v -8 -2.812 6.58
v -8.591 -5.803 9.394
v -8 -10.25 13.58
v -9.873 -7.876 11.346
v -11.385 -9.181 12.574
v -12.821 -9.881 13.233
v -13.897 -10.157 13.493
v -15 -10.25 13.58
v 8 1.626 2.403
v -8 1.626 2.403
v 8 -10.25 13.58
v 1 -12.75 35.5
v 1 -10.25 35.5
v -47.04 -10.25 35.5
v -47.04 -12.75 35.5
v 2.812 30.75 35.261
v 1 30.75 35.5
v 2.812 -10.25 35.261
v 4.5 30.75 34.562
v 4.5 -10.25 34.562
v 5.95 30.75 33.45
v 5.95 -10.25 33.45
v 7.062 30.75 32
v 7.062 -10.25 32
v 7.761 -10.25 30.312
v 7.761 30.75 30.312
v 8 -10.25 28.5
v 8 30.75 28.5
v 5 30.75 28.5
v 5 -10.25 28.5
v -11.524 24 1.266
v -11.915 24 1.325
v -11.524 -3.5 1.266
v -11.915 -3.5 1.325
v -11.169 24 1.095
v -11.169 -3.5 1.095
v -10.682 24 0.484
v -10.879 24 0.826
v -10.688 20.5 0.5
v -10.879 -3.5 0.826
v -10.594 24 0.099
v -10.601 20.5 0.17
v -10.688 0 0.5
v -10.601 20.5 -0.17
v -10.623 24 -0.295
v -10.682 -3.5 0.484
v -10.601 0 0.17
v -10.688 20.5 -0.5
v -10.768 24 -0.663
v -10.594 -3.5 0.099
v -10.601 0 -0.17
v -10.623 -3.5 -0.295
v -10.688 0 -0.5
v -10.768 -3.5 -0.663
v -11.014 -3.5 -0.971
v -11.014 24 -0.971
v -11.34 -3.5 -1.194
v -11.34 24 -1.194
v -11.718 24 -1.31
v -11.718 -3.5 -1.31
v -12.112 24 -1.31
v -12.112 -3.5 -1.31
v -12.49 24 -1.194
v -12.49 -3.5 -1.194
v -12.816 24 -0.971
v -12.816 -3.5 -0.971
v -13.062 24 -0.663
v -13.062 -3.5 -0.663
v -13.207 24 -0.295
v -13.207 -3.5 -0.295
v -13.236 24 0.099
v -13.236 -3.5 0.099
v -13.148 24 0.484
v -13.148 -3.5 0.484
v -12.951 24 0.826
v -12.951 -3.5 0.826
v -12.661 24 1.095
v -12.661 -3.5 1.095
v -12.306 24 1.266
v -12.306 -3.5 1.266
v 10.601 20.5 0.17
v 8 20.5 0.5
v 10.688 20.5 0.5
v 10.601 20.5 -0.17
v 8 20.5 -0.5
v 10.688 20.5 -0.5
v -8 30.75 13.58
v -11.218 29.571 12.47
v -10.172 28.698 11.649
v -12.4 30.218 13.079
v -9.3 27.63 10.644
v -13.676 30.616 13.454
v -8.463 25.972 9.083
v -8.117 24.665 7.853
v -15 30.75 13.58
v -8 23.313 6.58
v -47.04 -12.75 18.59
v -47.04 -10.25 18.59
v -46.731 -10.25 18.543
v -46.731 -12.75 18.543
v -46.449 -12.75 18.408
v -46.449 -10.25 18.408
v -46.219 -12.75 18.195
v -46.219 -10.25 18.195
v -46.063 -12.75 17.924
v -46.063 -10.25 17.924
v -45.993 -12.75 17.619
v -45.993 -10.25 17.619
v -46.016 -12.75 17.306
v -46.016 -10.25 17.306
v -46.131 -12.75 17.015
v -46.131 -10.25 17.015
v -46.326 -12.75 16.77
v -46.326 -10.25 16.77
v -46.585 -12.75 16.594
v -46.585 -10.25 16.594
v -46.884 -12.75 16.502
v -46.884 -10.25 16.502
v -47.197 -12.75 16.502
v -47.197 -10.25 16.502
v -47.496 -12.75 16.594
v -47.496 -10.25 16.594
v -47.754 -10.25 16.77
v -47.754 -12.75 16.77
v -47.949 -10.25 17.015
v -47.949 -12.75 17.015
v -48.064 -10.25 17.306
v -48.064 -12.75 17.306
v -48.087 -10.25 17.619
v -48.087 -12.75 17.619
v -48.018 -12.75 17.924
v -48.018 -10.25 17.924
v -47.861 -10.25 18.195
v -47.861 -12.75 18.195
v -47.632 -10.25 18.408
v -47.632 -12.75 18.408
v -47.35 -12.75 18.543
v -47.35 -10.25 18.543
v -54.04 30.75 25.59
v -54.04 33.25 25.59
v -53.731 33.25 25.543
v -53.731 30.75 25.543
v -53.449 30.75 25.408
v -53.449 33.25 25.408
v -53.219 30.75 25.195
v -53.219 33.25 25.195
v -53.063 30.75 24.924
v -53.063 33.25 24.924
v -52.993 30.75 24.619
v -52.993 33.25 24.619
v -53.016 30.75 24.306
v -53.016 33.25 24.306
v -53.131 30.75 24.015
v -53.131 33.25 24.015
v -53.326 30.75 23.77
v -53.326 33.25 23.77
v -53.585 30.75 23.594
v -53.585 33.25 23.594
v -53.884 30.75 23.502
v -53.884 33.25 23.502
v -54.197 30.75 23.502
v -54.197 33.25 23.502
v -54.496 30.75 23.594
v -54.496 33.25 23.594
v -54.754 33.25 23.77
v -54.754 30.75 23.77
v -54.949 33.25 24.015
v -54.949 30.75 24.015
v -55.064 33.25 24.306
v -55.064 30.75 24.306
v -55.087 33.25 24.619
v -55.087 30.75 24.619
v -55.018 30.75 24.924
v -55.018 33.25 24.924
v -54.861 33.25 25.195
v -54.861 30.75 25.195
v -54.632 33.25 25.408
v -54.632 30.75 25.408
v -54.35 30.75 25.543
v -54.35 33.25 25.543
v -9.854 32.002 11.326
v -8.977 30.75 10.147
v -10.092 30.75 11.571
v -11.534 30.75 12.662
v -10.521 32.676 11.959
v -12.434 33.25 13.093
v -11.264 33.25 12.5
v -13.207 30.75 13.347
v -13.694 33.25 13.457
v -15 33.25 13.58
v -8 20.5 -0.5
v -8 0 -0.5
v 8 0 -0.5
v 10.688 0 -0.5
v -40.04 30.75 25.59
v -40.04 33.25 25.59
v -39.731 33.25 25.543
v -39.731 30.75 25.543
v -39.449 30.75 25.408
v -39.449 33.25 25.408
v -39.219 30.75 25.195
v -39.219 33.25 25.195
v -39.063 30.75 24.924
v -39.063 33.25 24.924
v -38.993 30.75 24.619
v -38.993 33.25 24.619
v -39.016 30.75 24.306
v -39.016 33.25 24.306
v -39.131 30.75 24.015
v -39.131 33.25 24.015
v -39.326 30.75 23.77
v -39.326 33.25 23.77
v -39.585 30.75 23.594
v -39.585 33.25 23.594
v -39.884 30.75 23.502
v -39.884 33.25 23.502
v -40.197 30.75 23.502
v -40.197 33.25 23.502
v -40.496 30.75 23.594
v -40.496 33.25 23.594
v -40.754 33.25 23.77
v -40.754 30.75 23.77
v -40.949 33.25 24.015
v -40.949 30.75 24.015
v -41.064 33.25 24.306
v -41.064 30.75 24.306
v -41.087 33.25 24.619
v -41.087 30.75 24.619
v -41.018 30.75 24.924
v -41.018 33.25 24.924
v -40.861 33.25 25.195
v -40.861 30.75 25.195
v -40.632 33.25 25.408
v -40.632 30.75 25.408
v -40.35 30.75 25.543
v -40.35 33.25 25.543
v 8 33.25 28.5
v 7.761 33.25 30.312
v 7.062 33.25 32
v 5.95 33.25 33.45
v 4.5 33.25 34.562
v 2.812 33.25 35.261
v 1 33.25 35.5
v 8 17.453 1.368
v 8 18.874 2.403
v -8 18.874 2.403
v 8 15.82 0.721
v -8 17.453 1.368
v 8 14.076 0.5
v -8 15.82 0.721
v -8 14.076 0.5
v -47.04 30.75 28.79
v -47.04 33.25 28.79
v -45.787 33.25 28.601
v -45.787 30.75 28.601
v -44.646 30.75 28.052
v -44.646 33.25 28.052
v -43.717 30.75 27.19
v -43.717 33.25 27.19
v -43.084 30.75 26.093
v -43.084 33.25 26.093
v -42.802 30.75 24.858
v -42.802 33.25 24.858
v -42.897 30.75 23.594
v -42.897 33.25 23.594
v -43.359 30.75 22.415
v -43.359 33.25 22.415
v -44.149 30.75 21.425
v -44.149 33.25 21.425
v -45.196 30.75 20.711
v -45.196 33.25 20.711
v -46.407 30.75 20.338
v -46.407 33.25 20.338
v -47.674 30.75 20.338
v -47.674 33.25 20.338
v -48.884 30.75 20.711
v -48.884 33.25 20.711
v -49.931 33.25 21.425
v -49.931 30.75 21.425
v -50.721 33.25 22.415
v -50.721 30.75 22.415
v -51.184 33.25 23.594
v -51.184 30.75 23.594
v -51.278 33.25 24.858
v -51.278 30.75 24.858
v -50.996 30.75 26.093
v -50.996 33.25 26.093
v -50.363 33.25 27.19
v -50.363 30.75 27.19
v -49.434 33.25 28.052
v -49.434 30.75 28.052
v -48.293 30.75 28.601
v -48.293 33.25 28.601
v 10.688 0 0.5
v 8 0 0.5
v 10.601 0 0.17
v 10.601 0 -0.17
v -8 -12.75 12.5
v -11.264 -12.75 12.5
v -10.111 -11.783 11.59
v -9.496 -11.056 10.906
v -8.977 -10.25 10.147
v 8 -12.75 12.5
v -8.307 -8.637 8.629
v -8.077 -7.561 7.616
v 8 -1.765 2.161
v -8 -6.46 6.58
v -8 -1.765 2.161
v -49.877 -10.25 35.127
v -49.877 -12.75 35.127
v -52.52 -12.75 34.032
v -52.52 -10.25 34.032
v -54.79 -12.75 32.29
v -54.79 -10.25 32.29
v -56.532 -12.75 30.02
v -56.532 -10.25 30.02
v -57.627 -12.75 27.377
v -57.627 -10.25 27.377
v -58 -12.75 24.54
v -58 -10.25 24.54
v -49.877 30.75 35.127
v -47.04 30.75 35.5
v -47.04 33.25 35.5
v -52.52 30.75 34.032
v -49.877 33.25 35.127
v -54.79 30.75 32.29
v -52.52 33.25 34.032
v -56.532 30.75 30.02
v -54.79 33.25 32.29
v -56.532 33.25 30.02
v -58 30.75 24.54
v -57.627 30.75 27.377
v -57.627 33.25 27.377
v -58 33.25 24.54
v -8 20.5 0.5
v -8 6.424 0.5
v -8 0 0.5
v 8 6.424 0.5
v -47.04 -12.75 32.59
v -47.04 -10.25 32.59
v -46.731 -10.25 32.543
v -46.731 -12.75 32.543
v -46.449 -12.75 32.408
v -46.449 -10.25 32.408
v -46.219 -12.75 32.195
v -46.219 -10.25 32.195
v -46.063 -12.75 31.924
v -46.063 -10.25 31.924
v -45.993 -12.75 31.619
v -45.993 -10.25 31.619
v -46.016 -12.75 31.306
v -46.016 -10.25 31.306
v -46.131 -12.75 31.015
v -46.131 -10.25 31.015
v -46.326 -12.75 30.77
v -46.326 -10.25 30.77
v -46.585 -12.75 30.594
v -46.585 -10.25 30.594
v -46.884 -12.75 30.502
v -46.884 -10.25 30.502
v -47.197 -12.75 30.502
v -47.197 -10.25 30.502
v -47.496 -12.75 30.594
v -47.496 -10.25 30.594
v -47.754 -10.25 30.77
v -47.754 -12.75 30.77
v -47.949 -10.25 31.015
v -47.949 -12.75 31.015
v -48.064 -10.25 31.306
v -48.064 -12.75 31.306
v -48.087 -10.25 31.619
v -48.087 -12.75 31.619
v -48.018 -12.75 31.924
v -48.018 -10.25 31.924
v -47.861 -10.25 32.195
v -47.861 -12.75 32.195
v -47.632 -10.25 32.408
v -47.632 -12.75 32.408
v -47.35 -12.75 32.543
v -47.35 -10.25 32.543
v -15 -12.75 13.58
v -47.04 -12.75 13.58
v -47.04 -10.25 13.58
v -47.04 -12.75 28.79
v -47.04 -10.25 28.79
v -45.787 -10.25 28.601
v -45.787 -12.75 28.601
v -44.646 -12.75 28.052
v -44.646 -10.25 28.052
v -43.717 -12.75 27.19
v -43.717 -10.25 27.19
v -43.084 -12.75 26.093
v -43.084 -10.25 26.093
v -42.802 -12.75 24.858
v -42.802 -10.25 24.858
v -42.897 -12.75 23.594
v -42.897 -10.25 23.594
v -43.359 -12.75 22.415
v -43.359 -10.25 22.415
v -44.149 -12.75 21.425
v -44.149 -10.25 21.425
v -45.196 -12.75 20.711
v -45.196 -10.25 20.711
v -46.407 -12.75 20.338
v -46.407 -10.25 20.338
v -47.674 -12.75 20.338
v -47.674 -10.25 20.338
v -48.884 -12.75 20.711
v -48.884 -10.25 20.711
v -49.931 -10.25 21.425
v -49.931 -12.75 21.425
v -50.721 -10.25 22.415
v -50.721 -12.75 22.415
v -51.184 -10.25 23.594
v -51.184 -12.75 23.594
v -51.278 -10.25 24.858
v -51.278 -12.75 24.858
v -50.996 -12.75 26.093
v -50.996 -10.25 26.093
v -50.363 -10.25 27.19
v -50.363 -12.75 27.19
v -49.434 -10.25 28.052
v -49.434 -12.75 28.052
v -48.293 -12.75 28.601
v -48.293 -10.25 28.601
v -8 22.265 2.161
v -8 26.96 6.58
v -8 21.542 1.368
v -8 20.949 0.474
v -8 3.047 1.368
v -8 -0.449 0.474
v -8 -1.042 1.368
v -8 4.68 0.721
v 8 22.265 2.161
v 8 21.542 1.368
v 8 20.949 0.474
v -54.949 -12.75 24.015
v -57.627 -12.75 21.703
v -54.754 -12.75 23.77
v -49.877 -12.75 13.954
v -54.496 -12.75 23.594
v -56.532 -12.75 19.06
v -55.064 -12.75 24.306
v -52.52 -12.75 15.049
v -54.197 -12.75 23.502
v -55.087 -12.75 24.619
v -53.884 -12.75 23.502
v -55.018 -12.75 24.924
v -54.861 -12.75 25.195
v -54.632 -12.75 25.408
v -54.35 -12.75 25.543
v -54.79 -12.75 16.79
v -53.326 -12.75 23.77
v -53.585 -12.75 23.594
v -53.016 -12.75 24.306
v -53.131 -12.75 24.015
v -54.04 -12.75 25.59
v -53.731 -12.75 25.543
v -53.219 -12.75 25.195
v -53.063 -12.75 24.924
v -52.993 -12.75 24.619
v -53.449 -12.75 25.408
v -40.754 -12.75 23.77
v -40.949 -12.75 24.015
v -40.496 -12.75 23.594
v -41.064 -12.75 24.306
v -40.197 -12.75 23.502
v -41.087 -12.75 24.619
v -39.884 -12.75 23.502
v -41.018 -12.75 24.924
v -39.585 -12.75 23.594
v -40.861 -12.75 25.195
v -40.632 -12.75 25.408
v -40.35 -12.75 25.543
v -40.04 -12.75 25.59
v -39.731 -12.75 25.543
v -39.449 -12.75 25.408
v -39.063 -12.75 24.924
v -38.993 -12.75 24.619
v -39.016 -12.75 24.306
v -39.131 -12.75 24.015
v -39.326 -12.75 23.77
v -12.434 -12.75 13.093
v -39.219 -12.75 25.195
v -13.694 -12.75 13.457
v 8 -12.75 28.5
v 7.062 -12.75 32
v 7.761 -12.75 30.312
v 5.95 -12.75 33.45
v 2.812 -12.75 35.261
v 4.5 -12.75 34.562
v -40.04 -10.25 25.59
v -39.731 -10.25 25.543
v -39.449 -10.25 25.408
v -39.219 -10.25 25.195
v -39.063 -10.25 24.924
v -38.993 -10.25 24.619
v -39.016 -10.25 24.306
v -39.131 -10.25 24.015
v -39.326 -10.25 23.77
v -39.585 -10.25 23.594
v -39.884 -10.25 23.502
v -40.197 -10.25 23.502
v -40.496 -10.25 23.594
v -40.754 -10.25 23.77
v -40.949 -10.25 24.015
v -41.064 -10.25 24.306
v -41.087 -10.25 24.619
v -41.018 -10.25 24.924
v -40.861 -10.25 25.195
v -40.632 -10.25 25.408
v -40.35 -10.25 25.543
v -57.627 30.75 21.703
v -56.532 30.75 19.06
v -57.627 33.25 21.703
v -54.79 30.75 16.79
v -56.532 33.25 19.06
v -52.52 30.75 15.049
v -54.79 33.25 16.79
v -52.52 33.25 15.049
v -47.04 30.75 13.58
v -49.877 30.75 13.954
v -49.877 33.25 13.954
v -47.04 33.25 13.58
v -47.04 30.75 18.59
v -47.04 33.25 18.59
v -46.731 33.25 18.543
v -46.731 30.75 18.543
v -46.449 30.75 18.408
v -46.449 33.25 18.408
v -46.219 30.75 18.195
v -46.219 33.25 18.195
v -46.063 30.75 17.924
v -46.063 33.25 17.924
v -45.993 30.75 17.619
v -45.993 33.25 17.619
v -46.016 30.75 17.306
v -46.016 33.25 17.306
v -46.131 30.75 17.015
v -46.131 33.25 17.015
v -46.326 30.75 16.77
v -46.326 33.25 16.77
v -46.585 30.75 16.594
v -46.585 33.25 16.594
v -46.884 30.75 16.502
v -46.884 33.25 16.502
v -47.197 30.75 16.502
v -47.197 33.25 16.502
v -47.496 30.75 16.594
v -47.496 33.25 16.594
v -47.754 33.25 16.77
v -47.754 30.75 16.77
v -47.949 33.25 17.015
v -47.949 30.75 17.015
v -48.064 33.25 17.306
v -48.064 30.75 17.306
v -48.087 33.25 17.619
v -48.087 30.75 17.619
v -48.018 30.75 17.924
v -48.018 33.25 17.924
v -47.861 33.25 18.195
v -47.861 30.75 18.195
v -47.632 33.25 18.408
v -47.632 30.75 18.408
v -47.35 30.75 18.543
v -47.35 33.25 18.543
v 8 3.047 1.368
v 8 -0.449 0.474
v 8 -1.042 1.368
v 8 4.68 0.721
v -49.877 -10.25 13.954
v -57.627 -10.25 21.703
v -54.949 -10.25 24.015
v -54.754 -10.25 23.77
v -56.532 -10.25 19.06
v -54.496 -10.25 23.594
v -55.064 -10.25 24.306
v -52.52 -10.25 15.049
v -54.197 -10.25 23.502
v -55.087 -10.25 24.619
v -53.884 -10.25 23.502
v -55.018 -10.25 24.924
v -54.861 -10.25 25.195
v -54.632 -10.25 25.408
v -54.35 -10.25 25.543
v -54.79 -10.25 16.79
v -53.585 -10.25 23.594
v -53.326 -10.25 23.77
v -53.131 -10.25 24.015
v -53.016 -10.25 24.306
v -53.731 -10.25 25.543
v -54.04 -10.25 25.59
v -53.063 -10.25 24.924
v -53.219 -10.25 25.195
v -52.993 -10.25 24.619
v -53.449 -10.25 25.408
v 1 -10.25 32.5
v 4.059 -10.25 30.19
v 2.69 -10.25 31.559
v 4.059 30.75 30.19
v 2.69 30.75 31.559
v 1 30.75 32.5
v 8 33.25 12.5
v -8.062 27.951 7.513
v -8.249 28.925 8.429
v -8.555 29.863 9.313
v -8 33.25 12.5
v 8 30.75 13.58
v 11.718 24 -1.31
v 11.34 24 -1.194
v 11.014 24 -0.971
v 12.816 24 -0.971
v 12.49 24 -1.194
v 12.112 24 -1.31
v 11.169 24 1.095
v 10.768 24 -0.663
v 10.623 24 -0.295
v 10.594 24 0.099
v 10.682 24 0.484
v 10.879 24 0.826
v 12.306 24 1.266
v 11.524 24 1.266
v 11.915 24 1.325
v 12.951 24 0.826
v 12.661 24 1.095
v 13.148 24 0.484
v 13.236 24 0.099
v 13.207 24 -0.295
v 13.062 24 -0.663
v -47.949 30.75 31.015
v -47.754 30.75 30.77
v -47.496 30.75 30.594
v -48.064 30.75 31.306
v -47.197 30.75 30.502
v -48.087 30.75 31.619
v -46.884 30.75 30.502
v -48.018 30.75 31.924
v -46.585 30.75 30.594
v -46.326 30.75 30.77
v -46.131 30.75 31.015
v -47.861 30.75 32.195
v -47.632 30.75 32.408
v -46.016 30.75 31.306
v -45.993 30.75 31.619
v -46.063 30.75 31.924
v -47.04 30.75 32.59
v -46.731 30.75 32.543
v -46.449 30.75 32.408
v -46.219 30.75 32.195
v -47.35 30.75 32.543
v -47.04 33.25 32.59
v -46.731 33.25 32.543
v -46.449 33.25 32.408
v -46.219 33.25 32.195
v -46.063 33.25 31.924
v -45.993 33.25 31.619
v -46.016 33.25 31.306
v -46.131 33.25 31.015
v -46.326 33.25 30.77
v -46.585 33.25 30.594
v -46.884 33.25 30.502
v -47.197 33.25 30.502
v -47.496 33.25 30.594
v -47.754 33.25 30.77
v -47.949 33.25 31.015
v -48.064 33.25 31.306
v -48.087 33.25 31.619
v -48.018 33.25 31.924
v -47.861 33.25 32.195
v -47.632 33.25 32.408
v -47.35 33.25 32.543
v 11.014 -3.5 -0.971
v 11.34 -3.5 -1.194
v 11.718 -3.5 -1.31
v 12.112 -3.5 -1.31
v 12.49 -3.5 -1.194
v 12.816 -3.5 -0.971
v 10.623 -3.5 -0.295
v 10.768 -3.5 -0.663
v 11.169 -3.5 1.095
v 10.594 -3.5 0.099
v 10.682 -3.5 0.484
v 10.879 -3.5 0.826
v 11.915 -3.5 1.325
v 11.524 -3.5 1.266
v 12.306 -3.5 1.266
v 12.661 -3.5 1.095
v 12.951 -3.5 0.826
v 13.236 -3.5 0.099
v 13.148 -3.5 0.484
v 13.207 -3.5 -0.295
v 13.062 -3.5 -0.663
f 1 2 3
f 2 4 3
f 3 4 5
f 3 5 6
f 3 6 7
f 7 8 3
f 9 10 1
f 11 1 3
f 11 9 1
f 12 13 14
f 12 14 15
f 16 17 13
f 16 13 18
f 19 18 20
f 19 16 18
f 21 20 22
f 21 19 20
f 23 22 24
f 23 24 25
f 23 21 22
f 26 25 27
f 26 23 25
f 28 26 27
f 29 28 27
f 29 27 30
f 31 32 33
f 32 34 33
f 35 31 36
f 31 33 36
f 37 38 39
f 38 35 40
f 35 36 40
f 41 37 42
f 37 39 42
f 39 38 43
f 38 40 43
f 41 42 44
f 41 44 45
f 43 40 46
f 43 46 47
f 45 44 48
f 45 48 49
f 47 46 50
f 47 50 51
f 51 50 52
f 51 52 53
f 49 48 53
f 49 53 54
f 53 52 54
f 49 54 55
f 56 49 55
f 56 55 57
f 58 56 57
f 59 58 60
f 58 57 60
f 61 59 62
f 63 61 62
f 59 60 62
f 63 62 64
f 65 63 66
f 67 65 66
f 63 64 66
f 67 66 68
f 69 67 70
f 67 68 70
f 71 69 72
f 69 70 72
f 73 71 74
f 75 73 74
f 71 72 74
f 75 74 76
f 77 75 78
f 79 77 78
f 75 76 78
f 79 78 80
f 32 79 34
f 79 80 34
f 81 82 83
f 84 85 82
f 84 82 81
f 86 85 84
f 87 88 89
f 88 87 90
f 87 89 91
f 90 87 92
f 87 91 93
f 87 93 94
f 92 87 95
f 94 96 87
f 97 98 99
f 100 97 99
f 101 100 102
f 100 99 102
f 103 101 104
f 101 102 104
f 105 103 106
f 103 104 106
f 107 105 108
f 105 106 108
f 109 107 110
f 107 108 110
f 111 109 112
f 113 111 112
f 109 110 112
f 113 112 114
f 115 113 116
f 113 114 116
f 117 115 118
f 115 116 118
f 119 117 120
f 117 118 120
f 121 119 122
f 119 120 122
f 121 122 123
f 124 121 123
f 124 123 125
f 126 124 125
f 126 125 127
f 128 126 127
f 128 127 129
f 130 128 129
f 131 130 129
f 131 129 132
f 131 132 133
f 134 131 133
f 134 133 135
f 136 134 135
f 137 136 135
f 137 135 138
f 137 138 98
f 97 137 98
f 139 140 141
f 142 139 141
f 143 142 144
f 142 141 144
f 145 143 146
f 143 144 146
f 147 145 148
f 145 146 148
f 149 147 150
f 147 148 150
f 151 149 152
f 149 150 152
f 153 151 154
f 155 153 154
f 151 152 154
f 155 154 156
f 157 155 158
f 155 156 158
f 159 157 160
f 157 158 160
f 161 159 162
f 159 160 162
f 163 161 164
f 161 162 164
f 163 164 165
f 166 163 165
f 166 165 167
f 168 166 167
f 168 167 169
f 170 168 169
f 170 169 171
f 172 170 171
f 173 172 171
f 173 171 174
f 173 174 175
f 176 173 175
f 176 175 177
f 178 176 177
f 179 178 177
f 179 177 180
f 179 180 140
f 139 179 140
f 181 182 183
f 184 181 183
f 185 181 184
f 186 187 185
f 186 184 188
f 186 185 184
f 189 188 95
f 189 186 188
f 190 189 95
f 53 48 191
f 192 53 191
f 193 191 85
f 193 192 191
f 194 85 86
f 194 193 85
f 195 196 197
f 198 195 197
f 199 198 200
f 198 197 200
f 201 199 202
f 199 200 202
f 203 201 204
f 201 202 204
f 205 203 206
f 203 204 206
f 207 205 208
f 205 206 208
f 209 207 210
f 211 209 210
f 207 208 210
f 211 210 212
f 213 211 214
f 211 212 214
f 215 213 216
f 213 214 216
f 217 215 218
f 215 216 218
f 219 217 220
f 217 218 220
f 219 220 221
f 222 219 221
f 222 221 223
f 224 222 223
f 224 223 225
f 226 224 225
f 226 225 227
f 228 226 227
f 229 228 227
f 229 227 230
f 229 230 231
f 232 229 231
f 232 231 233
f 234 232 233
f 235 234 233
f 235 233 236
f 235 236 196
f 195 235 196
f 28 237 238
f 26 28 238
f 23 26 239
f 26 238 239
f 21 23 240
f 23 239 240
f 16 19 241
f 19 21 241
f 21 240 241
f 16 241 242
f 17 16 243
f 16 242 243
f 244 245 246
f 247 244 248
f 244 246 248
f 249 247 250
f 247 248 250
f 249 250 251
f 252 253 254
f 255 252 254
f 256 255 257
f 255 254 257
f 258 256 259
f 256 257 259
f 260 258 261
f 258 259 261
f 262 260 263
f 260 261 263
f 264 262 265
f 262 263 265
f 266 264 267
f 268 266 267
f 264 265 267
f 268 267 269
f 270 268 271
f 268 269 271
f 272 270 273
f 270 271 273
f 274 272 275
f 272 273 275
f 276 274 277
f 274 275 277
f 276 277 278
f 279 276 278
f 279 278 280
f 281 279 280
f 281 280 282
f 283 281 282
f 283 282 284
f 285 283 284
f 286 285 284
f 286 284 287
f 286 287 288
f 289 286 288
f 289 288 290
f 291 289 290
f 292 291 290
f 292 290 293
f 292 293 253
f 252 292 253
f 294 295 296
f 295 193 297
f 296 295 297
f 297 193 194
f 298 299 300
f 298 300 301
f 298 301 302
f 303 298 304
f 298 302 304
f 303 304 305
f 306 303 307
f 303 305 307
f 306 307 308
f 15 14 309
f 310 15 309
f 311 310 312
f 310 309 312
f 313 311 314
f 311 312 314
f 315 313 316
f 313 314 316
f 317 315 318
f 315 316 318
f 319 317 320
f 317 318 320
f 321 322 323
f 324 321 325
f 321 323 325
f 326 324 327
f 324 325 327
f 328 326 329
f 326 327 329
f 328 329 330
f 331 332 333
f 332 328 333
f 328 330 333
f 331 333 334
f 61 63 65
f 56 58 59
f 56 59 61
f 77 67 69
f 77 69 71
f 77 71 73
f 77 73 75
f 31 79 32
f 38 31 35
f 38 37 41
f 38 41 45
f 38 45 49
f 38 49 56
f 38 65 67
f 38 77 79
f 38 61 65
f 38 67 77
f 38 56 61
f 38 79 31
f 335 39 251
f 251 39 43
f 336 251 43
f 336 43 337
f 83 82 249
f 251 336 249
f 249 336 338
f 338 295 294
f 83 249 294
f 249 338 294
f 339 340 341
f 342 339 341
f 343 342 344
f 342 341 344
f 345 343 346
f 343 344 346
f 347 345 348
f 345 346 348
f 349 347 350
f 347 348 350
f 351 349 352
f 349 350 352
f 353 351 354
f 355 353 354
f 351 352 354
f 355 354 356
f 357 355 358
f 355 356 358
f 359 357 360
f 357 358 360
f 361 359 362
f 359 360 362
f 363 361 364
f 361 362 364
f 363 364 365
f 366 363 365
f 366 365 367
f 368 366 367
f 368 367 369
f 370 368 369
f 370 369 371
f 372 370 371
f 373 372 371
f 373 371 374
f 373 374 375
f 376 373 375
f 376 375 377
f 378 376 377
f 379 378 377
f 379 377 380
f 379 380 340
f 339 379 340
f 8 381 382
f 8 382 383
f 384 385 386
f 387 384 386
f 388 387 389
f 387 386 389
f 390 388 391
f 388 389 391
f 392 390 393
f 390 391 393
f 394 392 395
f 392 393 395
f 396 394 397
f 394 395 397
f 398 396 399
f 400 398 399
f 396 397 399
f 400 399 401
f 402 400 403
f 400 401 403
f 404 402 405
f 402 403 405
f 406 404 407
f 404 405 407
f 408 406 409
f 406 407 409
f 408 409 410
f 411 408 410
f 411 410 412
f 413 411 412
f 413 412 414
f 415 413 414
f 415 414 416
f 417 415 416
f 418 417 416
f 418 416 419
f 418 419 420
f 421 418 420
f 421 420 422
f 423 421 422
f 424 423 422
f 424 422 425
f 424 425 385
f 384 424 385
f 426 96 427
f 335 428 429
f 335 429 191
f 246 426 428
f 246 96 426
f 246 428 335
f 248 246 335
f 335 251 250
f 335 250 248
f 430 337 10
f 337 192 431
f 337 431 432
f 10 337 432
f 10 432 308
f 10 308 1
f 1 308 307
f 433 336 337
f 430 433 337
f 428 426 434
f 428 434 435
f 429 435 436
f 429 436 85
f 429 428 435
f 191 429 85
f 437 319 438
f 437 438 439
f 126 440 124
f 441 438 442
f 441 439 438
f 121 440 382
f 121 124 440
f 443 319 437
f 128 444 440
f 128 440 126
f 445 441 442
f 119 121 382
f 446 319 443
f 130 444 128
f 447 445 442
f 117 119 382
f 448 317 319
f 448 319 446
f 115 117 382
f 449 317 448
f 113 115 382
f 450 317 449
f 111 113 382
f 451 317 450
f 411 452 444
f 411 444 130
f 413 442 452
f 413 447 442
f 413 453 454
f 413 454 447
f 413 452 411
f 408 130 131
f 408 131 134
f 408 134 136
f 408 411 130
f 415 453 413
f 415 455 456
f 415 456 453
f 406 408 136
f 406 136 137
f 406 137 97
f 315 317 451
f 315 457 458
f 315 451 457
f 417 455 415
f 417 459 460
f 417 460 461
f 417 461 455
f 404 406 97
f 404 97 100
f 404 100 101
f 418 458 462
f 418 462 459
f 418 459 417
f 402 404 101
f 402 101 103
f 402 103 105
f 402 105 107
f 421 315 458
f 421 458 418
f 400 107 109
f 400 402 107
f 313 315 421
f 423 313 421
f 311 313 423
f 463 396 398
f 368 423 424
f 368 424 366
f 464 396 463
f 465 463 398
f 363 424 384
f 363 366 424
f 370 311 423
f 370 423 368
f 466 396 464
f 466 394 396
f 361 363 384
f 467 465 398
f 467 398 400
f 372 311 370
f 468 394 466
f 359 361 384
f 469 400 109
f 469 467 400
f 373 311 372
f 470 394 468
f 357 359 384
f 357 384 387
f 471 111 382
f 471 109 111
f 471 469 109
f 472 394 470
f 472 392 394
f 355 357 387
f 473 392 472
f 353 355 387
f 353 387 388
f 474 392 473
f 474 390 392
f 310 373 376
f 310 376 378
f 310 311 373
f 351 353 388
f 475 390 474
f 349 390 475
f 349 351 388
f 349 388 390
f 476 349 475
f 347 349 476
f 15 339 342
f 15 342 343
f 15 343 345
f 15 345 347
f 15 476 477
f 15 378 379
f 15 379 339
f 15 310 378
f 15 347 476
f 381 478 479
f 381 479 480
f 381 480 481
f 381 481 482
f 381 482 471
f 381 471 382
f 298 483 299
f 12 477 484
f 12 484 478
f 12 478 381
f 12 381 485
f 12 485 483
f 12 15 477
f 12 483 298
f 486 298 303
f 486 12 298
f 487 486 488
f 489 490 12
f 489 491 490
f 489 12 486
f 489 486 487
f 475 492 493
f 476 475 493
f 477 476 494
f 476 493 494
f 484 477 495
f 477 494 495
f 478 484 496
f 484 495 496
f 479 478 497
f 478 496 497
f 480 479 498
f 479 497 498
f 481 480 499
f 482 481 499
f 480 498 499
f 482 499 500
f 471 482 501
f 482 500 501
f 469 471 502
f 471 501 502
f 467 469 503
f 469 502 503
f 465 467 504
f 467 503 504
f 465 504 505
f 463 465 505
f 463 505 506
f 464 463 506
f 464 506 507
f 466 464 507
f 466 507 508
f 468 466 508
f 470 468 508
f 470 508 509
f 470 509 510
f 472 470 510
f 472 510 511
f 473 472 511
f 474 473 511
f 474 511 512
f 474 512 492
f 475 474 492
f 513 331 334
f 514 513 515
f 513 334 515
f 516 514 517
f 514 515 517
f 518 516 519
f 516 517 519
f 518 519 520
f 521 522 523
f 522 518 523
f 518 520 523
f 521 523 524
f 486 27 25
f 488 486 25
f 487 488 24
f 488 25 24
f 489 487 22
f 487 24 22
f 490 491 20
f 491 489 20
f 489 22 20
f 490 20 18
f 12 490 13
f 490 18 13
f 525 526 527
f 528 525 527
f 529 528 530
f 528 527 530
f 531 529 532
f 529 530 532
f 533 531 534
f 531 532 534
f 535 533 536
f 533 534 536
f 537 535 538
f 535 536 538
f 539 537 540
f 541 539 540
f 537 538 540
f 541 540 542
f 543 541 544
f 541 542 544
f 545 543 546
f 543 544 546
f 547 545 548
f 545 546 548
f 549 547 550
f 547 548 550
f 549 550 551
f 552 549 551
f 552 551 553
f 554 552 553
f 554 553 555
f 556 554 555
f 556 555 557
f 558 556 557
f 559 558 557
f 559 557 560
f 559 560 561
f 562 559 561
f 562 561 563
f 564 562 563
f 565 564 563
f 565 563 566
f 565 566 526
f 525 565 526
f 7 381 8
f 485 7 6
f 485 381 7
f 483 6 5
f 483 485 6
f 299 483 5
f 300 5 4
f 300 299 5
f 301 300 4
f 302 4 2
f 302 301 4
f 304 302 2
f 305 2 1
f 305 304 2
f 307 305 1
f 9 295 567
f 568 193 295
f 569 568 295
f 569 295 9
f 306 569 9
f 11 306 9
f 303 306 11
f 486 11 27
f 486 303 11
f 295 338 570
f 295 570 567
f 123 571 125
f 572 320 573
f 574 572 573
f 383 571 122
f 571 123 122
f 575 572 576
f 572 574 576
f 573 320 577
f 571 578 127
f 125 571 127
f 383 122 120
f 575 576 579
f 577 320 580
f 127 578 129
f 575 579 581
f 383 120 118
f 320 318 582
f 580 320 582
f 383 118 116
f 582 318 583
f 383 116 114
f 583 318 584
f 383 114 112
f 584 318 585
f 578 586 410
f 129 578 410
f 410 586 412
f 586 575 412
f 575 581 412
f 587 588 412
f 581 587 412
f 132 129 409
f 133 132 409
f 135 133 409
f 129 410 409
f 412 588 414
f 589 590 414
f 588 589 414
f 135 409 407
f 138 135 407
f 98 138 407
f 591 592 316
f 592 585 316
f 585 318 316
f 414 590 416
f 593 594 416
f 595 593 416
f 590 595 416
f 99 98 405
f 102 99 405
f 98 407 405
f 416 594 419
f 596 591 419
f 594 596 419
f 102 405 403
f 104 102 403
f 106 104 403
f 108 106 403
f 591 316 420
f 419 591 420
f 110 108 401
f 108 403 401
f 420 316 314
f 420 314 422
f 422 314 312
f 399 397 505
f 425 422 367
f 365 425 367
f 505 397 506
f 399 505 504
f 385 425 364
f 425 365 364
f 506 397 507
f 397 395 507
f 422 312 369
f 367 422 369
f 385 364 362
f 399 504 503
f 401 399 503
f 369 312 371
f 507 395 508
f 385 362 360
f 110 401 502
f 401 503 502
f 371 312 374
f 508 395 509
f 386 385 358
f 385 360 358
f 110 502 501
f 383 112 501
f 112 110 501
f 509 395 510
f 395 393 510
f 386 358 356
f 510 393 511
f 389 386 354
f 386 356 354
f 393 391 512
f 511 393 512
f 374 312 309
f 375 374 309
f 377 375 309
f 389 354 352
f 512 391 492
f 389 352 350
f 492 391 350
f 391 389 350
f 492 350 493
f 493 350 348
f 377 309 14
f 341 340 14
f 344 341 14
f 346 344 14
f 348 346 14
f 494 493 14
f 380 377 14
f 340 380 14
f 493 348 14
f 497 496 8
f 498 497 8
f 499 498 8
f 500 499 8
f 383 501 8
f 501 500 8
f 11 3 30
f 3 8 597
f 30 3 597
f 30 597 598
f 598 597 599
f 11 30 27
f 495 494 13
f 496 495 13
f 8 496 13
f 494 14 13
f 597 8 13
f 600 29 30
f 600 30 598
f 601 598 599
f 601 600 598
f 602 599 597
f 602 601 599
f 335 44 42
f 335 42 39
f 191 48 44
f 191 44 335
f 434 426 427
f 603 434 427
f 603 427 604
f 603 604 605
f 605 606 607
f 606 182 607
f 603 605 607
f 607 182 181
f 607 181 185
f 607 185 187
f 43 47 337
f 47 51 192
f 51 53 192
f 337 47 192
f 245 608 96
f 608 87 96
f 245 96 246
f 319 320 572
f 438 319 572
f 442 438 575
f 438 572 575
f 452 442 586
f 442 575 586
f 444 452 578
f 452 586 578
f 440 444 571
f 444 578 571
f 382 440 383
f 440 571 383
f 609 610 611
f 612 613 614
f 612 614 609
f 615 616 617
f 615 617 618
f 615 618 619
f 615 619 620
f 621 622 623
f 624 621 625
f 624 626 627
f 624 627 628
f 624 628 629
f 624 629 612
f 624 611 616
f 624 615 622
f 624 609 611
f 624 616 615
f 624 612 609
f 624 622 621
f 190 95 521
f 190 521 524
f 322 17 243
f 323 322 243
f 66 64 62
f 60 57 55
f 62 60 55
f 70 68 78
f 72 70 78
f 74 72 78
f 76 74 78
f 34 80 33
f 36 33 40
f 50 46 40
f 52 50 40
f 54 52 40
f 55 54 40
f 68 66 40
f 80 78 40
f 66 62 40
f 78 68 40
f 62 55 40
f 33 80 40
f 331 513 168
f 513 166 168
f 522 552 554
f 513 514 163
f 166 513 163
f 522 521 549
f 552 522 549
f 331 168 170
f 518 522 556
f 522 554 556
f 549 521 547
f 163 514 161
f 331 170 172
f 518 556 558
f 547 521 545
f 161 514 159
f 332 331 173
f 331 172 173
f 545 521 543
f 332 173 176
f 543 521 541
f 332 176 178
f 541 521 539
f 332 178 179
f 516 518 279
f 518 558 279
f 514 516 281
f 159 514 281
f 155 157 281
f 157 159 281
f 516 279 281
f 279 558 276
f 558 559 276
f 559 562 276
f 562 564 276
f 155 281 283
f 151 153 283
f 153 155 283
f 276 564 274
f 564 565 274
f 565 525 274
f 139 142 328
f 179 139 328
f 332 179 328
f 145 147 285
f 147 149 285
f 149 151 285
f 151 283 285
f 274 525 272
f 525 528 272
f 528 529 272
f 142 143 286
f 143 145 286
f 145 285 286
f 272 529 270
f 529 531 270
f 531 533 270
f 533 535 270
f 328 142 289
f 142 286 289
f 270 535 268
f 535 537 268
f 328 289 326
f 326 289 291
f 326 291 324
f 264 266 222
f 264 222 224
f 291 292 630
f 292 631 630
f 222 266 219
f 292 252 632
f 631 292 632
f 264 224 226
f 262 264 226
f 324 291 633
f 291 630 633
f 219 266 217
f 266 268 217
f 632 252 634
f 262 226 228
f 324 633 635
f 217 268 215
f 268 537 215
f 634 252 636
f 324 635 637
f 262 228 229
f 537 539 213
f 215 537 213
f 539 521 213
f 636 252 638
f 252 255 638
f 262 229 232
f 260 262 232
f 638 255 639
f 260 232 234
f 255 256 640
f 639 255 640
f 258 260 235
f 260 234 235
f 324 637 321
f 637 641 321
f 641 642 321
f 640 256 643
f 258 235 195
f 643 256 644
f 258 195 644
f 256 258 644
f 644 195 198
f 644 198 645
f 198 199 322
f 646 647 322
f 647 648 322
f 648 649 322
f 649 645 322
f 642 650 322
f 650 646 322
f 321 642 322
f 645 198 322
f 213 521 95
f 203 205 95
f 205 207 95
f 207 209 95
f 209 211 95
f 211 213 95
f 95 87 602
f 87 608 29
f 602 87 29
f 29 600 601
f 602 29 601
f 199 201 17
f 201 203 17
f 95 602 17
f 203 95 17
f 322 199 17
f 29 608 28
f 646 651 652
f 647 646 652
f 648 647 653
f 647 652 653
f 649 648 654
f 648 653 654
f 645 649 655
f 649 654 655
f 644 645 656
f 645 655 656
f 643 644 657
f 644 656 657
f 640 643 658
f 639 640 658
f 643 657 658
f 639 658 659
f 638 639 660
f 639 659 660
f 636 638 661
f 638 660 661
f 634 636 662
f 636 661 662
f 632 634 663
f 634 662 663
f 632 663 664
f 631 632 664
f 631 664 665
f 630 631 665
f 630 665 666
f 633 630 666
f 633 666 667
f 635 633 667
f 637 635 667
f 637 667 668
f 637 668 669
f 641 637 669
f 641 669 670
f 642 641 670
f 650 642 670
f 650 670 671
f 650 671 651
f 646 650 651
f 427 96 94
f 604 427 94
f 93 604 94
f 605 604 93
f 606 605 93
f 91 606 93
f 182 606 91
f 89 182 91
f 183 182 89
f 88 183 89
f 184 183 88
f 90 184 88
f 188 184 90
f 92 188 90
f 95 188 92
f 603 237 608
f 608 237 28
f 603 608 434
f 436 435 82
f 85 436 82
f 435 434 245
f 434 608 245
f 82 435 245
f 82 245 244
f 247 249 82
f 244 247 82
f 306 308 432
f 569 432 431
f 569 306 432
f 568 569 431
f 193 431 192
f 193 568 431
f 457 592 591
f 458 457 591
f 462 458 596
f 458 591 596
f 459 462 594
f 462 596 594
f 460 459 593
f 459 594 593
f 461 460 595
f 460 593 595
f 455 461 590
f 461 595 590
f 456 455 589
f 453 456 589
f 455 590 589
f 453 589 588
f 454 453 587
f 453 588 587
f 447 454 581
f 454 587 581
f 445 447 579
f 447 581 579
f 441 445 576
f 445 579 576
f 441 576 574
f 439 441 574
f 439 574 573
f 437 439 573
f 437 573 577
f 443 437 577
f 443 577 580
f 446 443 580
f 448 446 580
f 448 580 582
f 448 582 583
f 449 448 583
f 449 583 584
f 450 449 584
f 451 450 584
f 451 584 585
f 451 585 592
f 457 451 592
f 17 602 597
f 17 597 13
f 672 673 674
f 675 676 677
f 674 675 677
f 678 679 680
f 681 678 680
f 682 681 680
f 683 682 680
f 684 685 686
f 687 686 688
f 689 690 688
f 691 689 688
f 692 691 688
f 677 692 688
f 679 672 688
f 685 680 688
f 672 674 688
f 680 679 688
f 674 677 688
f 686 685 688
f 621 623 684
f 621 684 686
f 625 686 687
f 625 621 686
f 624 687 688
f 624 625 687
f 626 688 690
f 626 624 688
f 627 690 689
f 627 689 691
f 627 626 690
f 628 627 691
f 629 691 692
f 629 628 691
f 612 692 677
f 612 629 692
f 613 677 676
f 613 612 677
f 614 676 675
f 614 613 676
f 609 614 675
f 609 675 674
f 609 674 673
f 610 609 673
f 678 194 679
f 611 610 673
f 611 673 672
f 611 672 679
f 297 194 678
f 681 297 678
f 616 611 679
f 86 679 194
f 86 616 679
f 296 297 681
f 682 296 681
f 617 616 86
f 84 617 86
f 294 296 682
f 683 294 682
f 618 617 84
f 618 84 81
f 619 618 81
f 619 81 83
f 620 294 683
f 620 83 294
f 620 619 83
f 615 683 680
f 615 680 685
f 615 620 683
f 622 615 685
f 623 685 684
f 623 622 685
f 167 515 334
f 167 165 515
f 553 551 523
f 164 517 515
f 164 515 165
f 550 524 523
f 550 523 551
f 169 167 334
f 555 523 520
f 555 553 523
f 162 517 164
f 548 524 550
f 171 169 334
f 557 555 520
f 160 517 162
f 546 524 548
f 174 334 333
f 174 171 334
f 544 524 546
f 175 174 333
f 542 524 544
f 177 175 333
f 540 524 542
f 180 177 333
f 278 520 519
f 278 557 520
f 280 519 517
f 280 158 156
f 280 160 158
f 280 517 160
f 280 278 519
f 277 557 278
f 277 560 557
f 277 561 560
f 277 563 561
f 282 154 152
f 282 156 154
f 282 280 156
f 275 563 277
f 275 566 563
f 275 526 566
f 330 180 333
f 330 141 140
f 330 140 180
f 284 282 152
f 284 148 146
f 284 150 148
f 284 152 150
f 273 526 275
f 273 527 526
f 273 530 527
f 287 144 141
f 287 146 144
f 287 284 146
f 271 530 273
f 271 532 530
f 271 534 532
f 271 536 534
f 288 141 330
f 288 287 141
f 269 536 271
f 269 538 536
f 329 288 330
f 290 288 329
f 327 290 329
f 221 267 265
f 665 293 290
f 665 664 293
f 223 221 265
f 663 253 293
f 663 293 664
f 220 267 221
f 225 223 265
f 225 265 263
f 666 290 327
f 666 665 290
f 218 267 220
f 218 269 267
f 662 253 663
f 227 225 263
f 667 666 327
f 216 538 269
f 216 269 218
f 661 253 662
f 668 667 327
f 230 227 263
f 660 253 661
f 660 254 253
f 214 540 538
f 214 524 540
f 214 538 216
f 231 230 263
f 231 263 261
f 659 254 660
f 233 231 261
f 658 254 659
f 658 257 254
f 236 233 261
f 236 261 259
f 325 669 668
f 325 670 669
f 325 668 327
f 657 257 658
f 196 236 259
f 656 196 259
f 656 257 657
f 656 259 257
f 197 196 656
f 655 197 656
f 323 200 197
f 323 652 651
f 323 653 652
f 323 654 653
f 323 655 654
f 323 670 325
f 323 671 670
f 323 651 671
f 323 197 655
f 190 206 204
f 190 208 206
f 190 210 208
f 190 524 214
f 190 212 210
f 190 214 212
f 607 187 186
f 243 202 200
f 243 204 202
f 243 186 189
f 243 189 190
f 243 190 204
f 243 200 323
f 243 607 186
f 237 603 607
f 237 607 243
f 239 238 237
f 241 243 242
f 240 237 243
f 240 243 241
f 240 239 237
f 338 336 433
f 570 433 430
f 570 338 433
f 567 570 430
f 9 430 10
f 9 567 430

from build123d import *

# Parameters (mm, degrees)
SKETCH1_W           = 23.83
SKETCH1_H           = 1
BOSS_EXTRUDE1_DEPTH = 20.5
SKETCH2_R           = 1.325
BOSS_EXTRUDE2_DEPTH = 13.75
BOSS_EXTRUDE4_DEPTH = 8
SKETCH5_W           = 21.919818374
SKETCH5_H           = 2.5
BOSS_EXTRUDE5_DEPTH = 50
SKETCH6_R           = 4.25
SKETCH6_R_2         = 1.05
CUT_EXTRUDE1_DEPTH  = 83.099025573
FILLET1_R           = 7
FILLET2_R           = 7
FILLET3_R           = 7
BOSS_EXTRUDE6_START = 41
BOSS_EXTRUDE6_DEPTH = 41


with BuildPart() as part:
    # Sketch1 → Boss-Extrude1 (new body)
    with BuildSketch(Plane(origin=(0, 0, 0), x_dir=(1, 0, 0), z_dir=(0, 1, 0))):
        Rectangle(SKETCH1_W, SKETCH1_H)
    extrude(amount=BOSS_EXTRUDE1_DEPTH)

    # Sketch2 → Boss-Extrude2 (add, symmetric)
    with BuildSketch(Plane(origin=(0, 10.25, 0), x_dir=(1, 0, 0), z_dir=(0, 1, 0))):
        with Locations(Location((-11.915, 0, 0), (0, 0, 270))):
            Circle(SKETCH2_R)
        with Locations(Location((11.915, 0, 0), (0, 0, 270))):
            Circle(SKETCH2_R)
    extrude(amount=BOSS_EXTRUDE2_DEPTH, both=True)

    # Sketch4 → Boss-Extrude4 (add, symmetric)
    with BuildSketch(Plane(origin=(0, 0, 0), x_dir=(0, 0, -1), z_dir=(1, 0, 0))):
        Polygon((-0.5, 16.852307022), (-0.5, 20.5), (-12.5, 33.25), (-35.5, 33.25), (-35.5, 30.75), (-13.580181626, 30.75), align=None)
        Polygon((-0.5, 0), (-0.5, 3.647692978), (-13.580181626, -10.25), (-35.5, -10.25), (-35.5, -12.75), (-12.5, -12.75), align=None)
    extrude(amount=BOSS_EXTRUDE4_DEPTH, both=True)

    # Sketch5 → Boss-Extrude5 (add)
    with BuildSketch(Plane.ZY.offset(8)):
        with Locations((24.540090813, 32)):
            Rectangle(SKETCH5_W, SKETCH5_H)
        with Locations((24.540090813, -11.5)):
            Rectangle(SKETCH5_W, SKETCH5_H)
    extrude(amount=BOSS_EXTRUDE5_DEPTH)

    # Sketch6 → Cut-Extrude1 (cut, through all)
    with BuildSketch(Plane(origin=(0, 33.25, 0), x_dir=(1, 0, 0), z_dir=(0, 1, 0))):
        with Locations(Location((-47.040090813, -24.540090813, 0), (0, 0, 270))):
            Circle(SKETCH6_R)
        with Locations(Location((-54.040090813, -24.540090813, 0), (0, 0, 270))):
            Circle(SKETCH6_R_2)
        with Locations(Location((-47.040090813, -17.540090813, 0), (0, 0, 270))):
            Circle(SKETCH6_R_2)
        with Locations(Location((-40.040090813, -24.540090813, 0), (0, 0, 270))):
            Circle(SKETCH6_R_2)
        with Locations(Location((-47.040090813, -31.540090813, 0), (0, 0, 270))):
            Circle(SKETCH6_R_2)
        with BuildLine():
            ThreePointArc((-58, -24.540090813), (-54.78991692, -16.790264706), (-47.040090813, -13.580181626))
            Line((-47.040090813, -13.580181626), (-58, -13.580181626))
            Line((-58, -13.580181626), (-58, -24.540090813))
        make_face()
        with BuildLine():
            ThreePointArc((-47.040090813, -35.5), (-54.78991692, -32.28991692), (-58, -24.540090813))
            Line((-58, -24.540090813), (-58, -35.5))
            Line((-58, -35.5), (-47.040090813, -35.5))
        make_face()
    extrude(amount=-CUT_EXTRUDE1_DEPTH, mode=Mode.SUBTRACT)

    # Fillet1
    # the kernel refuses this fillet: 7 mm, written as the material it adds along each edge
    with BuildSketch(Plane(origin=(-8, -12.75, 13.580181626), x_dir=(-1, 0, 0), z_dir=(0, 1, 0))) as fillet1_piece_1_section:
        with BuildLine():
            CenterArc((FILLET1_R, -FILLET1_R), FILLET1_R, 90, 90)
            Line((0, -FILLET1_R), (0, 0))
            Line((0, 0), (FILLET1_R, 0))
        make_face()
    fillet1_piece_1 = extrude(amount=2.5, mode=Mode.PRIVATE)
    fillet1_piece_1 = split(fillet1_piece_1, bisect_by=Plane(origin=(-10.020174451, -12.153760937, 11.938833823), z_dir=(0, 0.6853646990049913, 0.7281999926928027)), keep=Keep.TOP, mode=Mode.PRIVATE)
    fillet1_piece_1 = split(fillet1_piece_1, bisect_by=Plane(origin=(-10.020174451, -10.440349189, 13.759333804), z_dir=(0, -0.685364699004991, -0.7281999926928029)), keep=Keep.TOP, mode=Mode.PRIVATE)
    add(fillet1_piece_1)
    with BuildSketch(Plane(origin=(-8, -12.75, 13.580181626), x_dir=(-1, 0, 0), z_dir=(0, 1, 0))) as fillet1_piece_2_section:
        with BuildLine():
            CenterArc((FILLET1_R, -FILLET1_R), FILLET1_R, 90, 90)
            Line((0, -FILLET1_R), (0, 0))
            Line((0, 0), (FILLET1_R, 0))
        make_face()
    fillet1_piece_2 = extrude(amount=20, mode=Mode.PRIVATE)
    fillet1_piece_2 = split(fillet1_piece_2, bisect_by=Plane(origin=(-8.816209607, -9.698679662, 9.628169093), z_dir=(0, 0.6853646990049913, 0.7281999926928027)), keep=Keep.TOP, mode=Mode.PRIVATE)
    fillet1_piece_2 = split(fillet1_piece_2, bisect_by=Plane(origin=(-8.816209607, -10.25, 10.809130305), z_dir=(0, 1, 0)), keep=Keep.TOP, mode=Mode.PRIVATE)
    fillet1_piece_2 = split(fillet1_piece_2, bisect_by=Plane(origin=(-8.816209607, -7.985267914, 11.448669075), z_dir=(0, -0.685364699004991, -0.7281999926928029)), keep=Keep.TOP, mode=Mode.PRIVATE)
    add(fillet1_piece_2)
    with BuildSketch(Plane(origin=(-8, 33.25, 13.580181626), x_dir=(0, 0, -1), z_dir=(0, -1, 0))) as fillet1_piece_3_section:
        with BuildLine():
            CenterArc((FILLET1_R, -FILLET1_R), FILLET1_R, 90, 90)
            Line((0, -FILLET1_R), (0, 0))
            Line((0, 0), (FILLET1_R, 0))
        make_face()
    fillet1_piece_3 = extrude(amount=2.5, mode=Mode.PRIVATE)
    fillet1_piece_3 = split(fillet1_piece_3, bisect_by=Plane(origin=(-10.020174451, 32.653760936, 11.938833823), z_dir=(0, -0.6853646990049912, 0.7281999926928028)), keep=Keep.TOP, mode=Mode.PRIVATE)
    fillet1_piece_3 = split(fillet1_piece_3, bisect_by=Plane(origin=(-10.020174451, 30.940349189, 13.759333804), z_dir=(0, 0.6853646990049909, -0.7281999926928031)), keep=Keep.TOP, mode=Mode.PRIVATE)
    add(fillet1_piece_3)
    with BuildSketch(Plane(origin=(-8, 33.25, 13.580181626), x_dir=(0, 0, -1), z_dir=(0, -1, 0))) as fillet1_piece_4_section:
        with BuildLine():
            CenterArc((FILLET1_R, -FILLET1_R), FILLET1_R, 90, 90)
            Line((0, -FILLET1_R), (0, 0))
            Line((0, 0), (FILLET1_R, 0))
        make_face()
    fillet1_piece_4 = extrude(amount=20, mode=Mode.PRIVATE)
    fillet1_piece_4 = split(fillet1_piece_4, bisect_by=Plane(origin=(-8.816209616, 30.198679665, 9.628169097), z_dir=(0, -0.6853646990049912, 0.7281999926928028)), keep=Keep.TOP, mode=Mode.PRIVATE)
    fillet1_piece_4 = split(fillet1_piece_4, bisect_by=Plane(origin=(-8.816209616, 28.485267918, 11.448669078), z_dir=(0, 0.6853646990049909, -0.7281999926928031)), keep=Keep.TOP, mode=Mode.PRIVATE)
    fillet1_piece_4 = split(fillet1_piece_4, bisect_by=Plane(origin=(-8.816209616, 30.75, 10.809130308), z_dir=(0, -1, 0)), keep=Keep.TOP, mode=Mode.PRIVATE)
    add(fillet1_piece_4)
    # the kernel refuses this fillet: 7 mm, written as the material it takes off along each edge
    with BuildSketch(Plane(origin=(8, 7.25, 35.5), x_dir=(0, 0, -1), z_dir=(0, -1, 0))) as fillet1_2_piece_1:
        with BuildLine():
            CenterArc((FILLET1_R, -FILLET1_R), FILLET1_R, 90, 90)
            Line((0, -FILLET1_R), (0, 0))
            Line((0, 0), (FILLET1_R, 0))
        make_face()
    extrude(amount=37.5, mode=Mode.SUBTRACT)
    with BuildSketch(Plane(origin=(8, 50.75, 35.5), x_dir=(-1, 0, 0), z_dir=(0, -1, 0))) as fillet1_2_piece_2:
        with BuildLine():
            CenterArc((FILLET1_R, FILLET1_R), FILLET1_R, 180, 90)
            Line((0, FILLET1_R), (0, 0))
            Line((0, 0), (FILLET1_R, 0))
        make_face()
    extrude(amount=37.5, mode=Mode.SUBTRACT)

    # Fillet2
    fillet2_edges = [part.edges().sort_by_distance(p)[0] for p in [
        (0, 16.852307022, 0.5),
        (0, 3.647692978, 0.5),
    ]]
    fillet(fillet2_edges, radius=FILLET2_R)

    # Fillet3
    # the kernel refuses this fillet: 7 mm, written as the material it adds along each edge
    with BuildSketch(Plane(origin=(-8, 20.5, 0.5), x_dir=(0, 0.7281999926925888, 0.6853646990052185), z_dir=(1, 0, 0))) as fillet3_piece_1:
        with BuildLine():
            CenterArc((2.423417163, -7), FILLET3_R, 90, 26.366519243)
            Line((-0.685364699, -0.728199993), (0, 0))
            Line((0, 0), (2.423417163, 0))
        make_face()
    extrude(amount=16)
    with BuildSketch(Plane(origin=(8, 0, 0.5), x_dir=(0, 0, -1), z_dir=(-1, 0, 0))) as fillet3_piece_2:
        with BuildLine():
            CenterArc((3.436475374, 6.562285254), FILLET3_R, 223.264295411, 26.366519243)
            Line((-1.660924575, 1.764732361), (0, 0))
            Line((0, 0), (1, 0))
        make_face()
    extrude(amount=16)

    # Sketch8 → Boss-Extrude6 (add)
    with BuildSketch(Plane(origin=(0, -10.25, 0), x_dir=(1, 0, 0), z_dir=(0, 1, 0)).offset(BOSS_EXTRUDE6_START)):
        with BuildLine():
            ThreePointArc((1, -35.5), (5.949747468, -33.449747468), (8, -28.5))
            Line((8, -28.5), (5, -28.5))
            ThreePointArc((5, -28.5), (3.422054899, -30.922054899), (1, -32.5))
            Line((1, -32.5), (1, -35.5))
        make_face()
    extrude(amount=-BOSS_EXTRUDE6_DEPTH)


solid = part.part
